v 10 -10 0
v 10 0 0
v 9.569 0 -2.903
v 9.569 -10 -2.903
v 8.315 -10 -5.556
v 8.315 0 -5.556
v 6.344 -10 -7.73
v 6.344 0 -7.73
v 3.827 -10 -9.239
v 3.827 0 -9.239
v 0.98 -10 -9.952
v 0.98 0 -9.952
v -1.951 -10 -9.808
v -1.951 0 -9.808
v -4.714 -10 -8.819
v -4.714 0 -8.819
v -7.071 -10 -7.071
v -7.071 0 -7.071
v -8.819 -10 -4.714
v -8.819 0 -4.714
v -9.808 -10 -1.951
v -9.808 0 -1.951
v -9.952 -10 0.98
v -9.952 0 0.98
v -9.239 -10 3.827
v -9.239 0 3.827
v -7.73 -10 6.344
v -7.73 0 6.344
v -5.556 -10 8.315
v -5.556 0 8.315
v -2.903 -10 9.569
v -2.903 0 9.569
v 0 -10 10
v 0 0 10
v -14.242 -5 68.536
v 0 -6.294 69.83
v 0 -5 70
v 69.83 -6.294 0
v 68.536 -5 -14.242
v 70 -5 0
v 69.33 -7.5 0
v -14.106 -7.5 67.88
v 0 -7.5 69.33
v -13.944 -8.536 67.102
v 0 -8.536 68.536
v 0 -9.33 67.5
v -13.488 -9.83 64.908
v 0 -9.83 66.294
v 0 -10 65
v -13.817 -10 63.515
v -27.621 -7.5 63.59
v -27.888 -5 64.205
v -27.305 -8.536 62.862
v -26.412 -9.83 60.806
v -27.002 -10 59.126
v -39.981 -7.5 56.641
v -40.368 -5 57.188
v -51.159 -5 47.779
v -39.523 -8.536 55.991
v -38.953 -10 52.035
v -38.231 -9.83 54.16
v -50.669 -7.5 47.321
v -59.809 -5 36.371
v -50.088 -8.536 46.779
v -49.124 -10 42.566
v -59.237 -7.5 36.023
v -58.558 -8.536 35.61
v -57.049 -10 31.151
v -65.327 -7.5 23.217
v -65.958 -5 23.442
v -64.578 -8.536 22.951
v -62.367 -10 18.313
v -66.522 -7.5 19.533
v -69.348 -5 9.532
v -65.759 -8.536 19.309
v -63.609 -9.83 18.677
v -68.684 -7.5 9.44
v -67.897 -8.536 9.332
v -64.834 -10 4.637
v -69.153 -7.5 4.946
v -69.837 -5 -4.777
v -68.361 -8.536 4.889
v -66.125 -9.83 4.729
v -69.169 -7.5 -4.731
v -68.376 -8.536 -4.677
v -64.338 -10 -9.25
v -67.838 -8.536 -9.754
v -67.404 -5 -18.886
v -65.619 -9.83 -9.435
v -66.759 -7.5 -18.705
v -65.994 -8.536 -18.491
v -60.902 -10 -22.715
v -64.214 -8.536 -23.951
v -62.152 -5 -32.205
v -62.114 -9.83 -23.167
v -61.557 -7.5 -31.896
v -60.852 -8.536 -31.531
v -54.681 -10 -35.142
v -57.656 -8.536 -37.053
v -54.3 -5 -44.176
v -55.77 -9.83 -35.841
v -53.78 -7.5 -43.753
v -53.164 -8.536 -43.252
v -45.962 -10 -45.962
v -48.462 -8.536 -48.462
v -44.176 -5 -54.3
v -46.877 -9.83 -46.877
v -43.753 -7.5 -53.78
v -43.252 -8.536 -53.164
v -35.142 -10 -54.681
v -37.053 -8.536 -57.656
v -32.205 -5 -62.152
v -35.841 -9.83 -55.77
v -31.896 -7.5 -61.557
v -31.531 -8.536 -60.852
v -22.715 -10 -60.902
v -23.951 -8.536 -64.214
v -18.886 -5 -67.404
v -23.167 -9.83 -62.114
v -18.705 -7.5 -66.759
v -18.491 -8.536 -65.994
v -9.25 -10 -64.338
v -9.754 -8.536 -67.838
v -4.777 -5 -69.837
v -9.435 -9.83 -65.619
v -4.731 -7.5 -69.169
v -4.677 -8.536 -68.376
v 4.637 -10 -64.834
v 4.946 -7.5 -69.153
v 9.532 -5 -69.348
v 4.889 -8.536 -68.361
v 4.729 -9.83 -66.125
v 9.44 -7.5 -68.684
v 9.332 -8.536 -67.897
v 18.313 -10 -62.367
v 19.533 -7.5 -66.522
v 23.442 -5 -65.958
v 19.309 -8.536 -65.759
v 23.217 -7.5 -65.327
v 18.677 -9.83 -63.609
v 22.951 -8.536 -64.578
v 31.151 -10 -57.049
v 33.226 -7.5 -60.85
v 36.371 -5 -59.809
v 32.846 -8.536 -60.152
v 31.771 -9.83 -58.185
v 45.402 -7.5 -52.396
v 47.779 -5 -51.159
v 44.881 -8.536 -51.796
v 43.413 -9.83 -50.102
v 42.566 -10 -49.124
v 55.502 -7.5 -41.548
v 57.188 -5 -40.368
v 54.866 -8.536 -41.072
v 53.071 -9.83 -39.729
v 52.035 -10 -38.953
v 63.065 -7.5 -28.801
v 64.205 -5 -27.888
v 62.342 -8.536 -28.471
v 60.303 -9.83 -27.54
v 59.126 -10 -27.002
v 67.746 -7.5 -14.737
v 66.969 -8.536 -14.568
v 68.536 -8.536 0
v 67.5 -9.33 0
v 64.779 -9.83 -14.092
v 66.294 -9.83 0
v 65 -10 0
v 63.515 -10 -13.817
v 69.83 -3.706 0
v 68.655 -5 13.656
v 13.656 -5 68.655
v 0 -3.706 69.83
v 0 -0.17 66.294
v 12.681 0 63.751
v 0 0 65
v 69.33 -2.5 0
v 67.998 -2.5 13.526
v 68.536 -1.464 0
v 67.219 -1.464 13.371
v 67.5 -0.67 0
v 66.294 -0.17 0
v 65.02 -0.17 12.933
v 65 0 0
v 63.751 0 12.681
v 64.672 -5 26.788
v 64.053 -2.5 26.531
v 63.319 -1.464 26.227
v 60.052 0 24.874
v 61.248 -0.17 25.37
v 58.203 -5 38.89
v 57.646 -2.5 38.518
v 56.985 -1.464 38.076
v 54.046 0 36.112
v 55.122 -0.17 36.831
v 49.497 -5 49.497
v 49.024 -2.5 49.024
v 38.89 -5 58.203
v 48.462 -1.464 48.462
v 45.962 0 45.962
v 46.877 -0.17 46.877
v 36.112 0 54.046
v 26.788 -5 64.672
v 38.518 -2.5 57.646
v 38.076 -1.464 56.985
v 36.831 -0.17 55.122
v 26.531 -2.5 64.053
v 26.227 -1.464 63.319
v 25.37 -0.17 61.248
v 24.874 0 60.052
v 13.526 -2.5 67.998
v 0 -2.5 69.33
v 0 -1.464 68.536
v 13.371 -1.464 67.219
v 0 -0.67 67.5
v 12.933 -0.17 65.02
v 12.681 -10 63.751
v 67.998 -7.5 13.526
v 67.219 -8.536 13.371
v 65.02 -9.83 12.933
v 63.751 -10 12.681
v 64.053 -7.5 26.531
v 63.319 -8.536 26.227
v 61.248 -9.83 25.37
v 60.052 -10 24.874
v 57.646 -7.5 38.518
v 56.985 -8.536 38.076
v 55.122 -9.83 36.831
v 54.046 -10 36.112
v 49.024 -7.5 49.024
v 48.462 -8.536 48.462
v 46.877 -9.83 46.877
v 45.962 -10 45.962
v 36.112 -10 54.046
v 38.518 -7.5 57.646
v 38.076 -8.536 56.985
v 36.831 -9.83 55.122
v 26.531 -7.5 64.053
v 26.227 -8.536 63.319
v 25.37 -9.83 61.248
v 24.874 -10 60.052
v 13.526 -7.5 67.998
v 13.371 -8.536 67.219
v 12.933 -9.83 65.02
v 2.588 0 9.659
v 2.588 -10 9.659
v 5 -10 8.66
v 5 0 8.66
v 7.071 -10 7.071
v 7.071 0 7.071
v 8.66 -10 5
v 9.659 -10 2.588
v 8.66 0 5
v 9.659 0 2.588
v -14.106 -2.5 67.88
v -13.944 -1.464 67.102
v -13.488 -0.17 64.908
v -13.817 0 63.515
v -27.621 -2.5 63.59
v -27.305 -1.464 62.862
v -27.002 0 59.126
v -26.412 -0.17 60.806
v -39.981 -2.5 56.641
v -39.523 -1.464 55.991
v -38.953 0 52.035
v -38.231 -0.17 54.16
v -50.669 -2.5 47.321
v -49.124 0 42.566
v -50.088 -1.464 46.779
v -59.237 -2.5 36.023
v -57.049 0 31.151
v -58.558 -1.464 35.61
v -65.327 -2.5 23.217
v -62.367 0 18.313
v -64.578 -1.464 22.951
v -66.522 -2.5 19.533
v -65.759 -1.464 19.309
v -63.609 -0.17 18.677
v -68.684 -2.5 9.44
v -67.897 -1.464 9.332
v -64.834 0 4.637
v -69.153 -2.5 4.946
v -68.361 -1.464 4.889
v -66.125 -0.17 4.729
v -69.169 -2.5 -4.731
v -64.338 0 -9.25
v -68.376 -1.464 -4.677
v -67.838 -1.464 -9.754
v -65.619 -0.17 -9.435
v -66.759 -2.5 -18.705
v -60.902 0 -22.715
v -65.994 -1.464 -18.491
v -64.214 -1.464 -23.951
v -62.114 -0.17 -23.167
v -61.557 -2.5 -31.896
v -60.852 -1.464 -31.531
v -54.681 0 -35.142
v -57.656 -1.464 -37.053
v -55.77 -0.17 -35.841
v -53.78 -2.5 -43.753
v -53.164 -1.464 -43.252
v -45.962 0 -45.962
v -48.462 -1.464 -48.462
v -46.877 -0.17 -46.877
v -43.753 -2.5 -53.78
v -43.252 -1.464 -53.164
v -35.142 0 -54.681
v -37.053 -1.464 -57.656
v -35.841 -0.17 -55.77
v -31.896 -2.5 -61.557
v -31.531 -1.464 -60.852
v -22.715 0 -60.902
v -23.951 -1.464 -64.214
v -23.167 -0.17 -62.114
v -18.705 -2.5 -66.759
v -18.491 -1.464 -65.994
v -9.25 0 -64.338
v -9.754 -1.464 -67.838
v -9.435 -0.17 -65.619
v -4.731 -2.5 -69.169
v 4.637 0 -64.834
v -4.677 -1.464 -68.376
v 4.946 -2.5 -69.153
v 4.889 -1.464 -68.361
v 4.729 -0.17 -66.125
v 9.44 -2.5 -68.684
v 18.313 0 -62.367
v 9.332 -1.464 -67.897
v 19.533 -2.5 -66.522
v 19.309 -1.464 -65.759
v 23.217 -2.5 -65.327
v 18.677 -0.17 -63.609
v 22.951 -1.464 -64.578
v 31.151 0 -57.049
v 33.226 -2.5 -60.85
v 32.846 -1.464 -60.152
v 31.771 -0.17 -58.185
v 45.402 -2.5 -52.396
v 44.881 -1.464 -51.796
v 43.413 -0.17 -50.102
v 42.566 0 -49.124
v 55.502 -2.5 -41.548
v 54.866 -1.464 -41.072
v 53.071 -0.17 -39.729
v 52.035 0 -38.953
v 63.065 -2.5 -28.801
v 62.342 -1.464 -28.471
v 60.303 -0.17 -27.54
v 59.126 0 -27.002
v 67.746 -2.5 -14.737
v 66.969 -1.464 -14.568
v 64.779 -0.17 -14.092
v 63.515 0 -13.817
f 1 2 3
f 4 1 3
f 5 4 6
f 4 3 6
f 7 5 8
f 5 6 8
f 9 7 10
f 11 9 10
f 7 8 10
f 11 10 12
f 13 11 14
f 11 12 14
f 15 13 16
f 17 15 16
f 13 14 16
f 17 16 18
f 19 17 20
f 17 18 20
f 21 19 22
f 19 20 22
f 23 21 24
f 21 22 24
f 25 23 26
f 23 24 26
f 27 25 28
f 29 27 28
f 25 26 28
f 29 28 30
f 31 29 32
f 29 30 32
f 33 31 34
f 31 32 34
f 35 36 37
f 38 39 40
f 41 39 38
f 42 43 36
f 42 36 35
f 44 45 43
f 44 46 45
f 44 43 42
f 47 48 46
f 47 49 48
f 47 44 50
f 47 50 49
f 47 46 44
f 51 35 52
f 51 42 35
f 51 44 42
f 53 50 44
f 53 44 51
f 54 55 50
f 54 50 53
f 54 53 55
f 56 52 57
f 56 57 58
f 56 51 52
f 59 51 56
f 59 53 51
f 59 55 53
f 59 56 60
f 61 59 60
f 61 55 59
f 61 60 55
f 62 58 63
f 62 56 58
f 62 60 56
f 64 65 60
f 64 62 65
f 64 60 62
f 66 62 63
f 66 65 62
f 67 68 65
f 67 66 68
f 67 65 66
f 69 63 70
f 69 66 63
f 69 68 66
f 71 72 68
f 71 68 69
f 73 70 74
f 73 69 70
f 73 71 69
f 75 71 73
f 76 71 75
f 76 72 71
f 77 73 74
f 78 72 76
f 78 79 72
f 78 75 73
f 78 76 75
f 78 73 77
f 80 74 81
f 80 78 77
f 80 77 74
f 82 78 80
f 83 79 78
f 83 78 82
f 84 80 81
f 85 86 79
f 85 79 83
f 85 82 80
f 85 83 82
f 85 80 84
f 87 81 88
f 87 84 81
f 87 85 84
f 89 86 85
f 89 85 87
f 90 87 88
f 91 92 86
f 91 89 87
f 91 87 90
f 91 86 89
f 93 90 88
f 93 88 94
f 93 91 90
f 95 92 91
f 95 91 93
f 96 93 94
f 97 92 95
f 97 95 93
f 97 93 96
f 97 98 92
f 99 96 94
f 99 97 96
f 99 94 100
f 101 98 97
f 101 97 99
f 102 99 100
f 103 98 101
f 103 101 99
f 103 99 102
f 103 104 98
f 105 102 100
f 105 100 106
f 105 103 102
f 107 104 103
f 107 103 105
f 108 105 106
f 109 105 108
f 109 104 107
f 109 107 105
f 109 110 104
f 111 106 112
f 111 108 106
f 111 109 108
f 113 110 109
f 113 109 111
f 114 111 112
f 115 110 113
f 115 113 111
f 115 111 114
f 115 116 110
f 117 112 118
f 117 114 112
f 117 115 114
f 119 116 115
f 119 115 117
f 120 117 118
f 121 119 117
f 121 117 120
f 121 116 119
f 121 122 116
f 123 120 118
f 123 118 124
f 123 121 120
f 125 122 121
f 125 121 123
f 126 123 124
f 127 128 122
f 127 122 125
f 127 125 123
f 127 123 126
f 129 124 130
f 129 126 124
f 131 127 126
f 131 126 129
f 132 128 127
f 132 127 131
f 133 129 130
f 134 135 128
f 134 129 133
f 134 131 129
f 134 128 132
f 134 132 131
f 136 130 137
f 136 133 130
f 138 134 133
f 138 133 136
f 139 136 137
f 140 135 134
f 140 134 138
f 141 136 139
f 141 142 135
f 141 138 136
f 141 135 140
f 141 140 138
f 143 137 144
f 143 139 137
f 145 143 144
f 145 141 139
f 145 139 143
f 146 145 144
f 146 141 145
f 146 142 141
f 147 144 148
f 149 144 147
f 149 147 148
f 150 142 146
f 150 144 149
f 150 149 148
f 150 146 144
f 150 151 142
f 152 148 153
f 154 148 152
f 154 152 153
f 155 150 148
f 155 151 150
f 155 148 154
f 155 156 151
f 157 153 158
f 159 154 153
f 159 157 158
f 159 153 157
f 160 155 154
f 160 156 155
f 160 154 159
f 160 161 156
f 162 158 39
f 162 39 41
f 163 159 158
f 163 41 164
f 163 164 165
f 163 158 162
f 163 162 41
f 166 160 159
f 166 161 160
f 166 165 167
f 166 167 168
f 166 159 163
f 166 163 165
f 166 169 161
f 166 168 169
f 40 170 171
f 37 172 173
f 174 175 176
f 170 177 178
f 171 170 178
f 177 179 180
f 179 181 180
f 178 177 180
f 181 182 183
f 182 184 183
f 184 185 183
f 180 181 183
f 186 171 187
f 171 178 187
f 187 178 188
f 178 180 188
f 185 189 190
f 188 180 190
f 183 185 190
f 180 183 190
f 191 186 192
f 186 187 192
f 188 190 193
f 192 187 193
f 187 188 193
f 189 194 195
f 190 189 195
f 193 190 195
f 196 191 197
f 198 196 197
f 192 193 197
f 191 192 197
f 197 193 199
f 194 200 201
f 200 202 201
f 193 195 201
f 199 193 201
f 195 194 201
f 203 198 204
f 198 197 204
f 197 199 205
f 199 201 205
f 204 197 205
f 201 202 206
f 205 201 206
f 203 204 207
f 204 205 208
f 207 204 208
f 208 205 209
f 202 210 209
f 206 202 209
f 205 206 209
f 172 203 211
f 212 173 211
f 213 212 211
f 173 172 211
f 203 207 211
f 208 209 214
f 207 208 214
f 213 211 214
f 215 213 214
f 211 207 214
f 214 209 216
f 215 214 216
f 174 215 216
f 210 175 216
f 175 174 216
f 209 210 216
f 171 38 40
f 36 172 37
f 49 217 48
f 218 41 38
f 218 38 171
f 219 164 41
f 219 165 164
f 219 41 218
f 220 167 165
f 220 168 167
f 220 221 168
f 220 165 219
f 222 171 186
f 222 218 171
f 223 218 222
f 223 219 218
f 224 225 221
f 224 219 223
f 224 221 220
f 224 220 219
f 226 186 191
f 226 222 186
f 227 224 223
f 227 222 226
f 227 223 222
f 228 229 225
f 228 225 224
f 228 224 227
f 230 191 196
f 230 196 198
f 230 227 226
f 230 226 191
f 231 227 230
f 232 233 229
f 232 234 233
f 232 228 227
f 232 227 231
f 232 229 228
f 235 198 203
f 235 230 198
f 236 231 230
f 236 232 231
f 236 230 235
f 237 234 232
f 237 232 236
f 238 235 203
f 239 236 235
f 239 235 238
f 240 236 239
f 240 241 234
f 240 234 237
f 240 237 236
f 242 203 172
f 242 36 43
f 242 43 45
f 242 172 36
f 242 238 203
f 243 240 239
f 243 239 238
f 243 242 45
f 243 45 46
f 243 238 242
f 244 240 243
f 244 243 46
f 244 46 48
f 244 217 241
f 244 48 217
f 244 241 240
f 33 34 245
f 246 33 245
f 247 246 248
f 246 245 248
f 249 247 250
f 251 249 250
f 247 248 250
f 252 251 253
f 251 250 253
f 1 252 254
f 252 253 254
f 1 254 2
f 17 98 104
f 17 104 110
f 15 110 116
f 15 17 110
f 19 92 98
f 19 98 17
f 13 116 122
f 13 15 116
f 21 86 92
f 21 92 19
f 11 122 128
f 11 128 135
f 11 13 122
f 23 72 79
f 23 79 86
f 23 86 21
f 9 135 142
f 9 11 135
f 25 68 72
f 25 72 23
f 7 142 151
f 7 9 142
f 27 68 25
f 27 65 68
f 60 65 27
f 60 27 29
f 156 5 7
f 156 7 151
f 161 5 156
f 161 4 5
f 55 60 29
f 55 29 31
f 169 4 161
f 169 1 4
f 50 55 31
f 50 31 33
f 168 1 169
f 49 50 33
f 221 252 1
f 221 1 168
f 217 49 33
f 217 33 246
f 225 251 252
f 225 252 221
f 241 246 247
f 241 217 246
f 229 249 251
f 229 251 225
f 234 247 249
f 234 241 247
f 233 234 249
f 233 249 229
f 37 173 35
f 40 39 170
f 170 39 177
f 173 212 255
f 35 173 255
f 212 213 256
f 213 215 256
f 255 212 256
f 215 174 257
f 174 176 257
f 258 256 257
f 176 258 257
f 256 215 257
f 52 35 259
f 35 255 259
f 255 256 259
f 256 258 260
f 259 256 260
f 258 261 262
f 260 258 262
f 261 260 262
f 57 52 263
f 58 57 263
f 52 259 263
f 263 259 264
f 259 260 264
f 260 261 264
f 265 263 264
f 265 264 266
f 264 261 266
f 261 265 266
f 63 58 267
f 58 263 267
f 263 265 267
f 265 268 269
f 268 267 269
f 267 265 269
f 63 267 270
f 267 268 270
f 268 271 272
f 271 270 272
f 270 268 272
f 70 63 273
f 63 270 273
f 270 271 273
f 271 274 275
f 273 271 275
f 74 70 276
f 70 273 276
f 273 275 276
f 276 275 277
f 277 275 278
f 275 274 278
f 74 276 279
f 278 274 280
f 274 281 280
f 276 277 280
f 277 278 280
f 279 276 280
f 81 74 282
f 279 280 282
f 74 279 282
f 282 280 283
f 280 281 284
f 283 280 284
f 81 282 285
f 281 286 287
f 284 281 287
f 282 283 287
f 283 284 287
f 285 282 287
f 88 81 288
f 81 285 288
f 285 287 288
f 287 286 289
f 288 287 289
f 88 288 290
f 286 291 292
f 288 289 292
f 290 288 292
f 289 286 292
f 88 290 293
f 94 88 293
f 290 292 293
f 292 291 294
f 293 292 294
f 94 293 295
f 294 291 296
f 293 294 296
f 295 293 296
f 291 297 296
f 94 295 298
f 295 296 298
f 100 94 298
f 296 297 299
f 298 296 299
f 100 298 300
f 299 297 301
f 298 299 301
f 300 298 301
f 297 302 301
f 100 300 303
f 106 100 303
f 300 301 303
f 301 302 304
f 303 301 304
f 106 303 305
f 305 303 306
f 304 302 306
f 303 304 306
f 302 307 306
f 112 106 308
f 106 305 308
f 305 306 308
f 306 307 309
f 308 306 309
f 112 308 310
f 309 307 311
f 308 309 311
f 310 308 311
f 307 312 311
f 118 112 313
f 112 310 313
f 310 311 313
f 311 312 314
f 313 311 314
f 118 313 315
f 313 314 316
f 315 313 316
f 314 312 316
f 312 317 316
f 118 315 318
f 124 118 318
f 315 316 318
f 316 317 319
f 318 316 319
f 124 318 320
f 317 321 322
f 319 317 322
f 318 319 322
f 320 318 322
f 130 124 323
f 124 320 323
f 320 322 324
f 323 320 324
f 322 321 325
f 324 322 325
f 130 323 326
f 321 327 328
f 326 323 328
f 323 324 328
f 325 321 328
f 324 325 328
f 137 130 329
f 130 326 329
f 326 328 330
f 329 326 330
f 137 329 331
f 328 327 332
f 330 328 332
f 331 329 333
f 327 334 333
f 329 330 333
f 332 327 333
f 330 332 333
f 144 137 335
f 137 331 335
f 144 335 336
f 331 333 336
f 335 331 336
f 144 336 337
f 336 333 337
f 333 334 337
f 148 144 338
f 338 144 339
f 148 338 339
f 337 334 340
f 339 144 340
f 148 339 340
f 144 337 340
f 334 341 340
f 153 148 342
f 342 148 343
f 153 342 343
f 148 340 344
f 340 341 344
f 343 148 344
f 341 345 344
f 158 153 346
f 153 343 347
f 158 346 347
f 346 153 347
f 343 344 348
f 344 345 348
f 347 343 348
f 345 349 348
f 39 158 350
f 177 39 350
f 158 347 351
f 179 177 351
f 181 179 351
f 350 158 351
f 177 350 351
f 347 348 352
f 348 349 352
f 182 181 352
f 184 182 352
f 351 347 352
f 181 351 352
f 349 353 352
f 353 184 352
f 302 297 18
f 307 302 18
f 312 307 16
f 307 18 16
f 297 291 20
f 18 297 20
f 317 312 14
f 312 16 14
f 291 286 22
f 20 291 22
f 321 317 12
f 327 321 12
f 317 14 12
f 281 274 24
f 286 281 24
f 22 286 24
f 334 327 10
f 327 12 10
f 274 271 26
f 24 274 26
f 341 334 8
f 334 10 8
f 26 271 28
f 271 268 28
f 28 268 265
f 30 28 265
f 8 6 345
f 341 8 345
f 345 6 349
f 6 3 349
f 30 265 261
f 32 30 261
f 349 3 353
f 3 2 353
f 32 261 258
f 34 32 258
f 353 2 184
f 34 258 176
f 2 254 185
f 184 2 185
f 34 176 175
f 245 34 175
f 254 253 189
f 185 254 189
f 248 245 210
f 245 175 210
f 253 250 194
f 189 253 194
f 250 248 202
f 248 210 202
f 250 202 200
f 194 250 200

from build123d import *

# Parameters (mm, degrees)
F1_DEPTH = 10
F2_R     = 4.99999


# Not quite as in the source:
# - a fillet or chamfer is up to 0.001 mm smaller than in the source, because OpenCascade refuses the exact size


with BuildPart() as f1:
    # F0 (on Front) → F1 (new body)
    with BuildSketch(Plane.XZ):
        with BuildLine():
            ThreePointArc((0, 70), (-49.4974746831, -49.4974746831), (70, 0))
            ThreePointArc((70, 0), (49.4974746831, 49.4974746831), (0, 70))
        make_face()
        with BuildLine():
            ThreePointArc((10, 0), (-7.0710678119, -7.0710678119), (0, 10))
            ThreePointArc((0, 10), (7.0710678119, 7.0710678119), (10, 0))
        make_face(mode=Mode.SUBTRACT)
    extrude(amount=F1_DEPTH)

    # F2 (radius 5 in the source; OpenCascade refuses exactly that, so slightly less here)
    f2_edges = [f1.edges().sort_by_distance(p)[0] for p in [
        (-70, -10, 0),
        (-70, 0, 0),
    ]]
    fillet(f2_edges, radius=F2_R)


solid = f1.part
